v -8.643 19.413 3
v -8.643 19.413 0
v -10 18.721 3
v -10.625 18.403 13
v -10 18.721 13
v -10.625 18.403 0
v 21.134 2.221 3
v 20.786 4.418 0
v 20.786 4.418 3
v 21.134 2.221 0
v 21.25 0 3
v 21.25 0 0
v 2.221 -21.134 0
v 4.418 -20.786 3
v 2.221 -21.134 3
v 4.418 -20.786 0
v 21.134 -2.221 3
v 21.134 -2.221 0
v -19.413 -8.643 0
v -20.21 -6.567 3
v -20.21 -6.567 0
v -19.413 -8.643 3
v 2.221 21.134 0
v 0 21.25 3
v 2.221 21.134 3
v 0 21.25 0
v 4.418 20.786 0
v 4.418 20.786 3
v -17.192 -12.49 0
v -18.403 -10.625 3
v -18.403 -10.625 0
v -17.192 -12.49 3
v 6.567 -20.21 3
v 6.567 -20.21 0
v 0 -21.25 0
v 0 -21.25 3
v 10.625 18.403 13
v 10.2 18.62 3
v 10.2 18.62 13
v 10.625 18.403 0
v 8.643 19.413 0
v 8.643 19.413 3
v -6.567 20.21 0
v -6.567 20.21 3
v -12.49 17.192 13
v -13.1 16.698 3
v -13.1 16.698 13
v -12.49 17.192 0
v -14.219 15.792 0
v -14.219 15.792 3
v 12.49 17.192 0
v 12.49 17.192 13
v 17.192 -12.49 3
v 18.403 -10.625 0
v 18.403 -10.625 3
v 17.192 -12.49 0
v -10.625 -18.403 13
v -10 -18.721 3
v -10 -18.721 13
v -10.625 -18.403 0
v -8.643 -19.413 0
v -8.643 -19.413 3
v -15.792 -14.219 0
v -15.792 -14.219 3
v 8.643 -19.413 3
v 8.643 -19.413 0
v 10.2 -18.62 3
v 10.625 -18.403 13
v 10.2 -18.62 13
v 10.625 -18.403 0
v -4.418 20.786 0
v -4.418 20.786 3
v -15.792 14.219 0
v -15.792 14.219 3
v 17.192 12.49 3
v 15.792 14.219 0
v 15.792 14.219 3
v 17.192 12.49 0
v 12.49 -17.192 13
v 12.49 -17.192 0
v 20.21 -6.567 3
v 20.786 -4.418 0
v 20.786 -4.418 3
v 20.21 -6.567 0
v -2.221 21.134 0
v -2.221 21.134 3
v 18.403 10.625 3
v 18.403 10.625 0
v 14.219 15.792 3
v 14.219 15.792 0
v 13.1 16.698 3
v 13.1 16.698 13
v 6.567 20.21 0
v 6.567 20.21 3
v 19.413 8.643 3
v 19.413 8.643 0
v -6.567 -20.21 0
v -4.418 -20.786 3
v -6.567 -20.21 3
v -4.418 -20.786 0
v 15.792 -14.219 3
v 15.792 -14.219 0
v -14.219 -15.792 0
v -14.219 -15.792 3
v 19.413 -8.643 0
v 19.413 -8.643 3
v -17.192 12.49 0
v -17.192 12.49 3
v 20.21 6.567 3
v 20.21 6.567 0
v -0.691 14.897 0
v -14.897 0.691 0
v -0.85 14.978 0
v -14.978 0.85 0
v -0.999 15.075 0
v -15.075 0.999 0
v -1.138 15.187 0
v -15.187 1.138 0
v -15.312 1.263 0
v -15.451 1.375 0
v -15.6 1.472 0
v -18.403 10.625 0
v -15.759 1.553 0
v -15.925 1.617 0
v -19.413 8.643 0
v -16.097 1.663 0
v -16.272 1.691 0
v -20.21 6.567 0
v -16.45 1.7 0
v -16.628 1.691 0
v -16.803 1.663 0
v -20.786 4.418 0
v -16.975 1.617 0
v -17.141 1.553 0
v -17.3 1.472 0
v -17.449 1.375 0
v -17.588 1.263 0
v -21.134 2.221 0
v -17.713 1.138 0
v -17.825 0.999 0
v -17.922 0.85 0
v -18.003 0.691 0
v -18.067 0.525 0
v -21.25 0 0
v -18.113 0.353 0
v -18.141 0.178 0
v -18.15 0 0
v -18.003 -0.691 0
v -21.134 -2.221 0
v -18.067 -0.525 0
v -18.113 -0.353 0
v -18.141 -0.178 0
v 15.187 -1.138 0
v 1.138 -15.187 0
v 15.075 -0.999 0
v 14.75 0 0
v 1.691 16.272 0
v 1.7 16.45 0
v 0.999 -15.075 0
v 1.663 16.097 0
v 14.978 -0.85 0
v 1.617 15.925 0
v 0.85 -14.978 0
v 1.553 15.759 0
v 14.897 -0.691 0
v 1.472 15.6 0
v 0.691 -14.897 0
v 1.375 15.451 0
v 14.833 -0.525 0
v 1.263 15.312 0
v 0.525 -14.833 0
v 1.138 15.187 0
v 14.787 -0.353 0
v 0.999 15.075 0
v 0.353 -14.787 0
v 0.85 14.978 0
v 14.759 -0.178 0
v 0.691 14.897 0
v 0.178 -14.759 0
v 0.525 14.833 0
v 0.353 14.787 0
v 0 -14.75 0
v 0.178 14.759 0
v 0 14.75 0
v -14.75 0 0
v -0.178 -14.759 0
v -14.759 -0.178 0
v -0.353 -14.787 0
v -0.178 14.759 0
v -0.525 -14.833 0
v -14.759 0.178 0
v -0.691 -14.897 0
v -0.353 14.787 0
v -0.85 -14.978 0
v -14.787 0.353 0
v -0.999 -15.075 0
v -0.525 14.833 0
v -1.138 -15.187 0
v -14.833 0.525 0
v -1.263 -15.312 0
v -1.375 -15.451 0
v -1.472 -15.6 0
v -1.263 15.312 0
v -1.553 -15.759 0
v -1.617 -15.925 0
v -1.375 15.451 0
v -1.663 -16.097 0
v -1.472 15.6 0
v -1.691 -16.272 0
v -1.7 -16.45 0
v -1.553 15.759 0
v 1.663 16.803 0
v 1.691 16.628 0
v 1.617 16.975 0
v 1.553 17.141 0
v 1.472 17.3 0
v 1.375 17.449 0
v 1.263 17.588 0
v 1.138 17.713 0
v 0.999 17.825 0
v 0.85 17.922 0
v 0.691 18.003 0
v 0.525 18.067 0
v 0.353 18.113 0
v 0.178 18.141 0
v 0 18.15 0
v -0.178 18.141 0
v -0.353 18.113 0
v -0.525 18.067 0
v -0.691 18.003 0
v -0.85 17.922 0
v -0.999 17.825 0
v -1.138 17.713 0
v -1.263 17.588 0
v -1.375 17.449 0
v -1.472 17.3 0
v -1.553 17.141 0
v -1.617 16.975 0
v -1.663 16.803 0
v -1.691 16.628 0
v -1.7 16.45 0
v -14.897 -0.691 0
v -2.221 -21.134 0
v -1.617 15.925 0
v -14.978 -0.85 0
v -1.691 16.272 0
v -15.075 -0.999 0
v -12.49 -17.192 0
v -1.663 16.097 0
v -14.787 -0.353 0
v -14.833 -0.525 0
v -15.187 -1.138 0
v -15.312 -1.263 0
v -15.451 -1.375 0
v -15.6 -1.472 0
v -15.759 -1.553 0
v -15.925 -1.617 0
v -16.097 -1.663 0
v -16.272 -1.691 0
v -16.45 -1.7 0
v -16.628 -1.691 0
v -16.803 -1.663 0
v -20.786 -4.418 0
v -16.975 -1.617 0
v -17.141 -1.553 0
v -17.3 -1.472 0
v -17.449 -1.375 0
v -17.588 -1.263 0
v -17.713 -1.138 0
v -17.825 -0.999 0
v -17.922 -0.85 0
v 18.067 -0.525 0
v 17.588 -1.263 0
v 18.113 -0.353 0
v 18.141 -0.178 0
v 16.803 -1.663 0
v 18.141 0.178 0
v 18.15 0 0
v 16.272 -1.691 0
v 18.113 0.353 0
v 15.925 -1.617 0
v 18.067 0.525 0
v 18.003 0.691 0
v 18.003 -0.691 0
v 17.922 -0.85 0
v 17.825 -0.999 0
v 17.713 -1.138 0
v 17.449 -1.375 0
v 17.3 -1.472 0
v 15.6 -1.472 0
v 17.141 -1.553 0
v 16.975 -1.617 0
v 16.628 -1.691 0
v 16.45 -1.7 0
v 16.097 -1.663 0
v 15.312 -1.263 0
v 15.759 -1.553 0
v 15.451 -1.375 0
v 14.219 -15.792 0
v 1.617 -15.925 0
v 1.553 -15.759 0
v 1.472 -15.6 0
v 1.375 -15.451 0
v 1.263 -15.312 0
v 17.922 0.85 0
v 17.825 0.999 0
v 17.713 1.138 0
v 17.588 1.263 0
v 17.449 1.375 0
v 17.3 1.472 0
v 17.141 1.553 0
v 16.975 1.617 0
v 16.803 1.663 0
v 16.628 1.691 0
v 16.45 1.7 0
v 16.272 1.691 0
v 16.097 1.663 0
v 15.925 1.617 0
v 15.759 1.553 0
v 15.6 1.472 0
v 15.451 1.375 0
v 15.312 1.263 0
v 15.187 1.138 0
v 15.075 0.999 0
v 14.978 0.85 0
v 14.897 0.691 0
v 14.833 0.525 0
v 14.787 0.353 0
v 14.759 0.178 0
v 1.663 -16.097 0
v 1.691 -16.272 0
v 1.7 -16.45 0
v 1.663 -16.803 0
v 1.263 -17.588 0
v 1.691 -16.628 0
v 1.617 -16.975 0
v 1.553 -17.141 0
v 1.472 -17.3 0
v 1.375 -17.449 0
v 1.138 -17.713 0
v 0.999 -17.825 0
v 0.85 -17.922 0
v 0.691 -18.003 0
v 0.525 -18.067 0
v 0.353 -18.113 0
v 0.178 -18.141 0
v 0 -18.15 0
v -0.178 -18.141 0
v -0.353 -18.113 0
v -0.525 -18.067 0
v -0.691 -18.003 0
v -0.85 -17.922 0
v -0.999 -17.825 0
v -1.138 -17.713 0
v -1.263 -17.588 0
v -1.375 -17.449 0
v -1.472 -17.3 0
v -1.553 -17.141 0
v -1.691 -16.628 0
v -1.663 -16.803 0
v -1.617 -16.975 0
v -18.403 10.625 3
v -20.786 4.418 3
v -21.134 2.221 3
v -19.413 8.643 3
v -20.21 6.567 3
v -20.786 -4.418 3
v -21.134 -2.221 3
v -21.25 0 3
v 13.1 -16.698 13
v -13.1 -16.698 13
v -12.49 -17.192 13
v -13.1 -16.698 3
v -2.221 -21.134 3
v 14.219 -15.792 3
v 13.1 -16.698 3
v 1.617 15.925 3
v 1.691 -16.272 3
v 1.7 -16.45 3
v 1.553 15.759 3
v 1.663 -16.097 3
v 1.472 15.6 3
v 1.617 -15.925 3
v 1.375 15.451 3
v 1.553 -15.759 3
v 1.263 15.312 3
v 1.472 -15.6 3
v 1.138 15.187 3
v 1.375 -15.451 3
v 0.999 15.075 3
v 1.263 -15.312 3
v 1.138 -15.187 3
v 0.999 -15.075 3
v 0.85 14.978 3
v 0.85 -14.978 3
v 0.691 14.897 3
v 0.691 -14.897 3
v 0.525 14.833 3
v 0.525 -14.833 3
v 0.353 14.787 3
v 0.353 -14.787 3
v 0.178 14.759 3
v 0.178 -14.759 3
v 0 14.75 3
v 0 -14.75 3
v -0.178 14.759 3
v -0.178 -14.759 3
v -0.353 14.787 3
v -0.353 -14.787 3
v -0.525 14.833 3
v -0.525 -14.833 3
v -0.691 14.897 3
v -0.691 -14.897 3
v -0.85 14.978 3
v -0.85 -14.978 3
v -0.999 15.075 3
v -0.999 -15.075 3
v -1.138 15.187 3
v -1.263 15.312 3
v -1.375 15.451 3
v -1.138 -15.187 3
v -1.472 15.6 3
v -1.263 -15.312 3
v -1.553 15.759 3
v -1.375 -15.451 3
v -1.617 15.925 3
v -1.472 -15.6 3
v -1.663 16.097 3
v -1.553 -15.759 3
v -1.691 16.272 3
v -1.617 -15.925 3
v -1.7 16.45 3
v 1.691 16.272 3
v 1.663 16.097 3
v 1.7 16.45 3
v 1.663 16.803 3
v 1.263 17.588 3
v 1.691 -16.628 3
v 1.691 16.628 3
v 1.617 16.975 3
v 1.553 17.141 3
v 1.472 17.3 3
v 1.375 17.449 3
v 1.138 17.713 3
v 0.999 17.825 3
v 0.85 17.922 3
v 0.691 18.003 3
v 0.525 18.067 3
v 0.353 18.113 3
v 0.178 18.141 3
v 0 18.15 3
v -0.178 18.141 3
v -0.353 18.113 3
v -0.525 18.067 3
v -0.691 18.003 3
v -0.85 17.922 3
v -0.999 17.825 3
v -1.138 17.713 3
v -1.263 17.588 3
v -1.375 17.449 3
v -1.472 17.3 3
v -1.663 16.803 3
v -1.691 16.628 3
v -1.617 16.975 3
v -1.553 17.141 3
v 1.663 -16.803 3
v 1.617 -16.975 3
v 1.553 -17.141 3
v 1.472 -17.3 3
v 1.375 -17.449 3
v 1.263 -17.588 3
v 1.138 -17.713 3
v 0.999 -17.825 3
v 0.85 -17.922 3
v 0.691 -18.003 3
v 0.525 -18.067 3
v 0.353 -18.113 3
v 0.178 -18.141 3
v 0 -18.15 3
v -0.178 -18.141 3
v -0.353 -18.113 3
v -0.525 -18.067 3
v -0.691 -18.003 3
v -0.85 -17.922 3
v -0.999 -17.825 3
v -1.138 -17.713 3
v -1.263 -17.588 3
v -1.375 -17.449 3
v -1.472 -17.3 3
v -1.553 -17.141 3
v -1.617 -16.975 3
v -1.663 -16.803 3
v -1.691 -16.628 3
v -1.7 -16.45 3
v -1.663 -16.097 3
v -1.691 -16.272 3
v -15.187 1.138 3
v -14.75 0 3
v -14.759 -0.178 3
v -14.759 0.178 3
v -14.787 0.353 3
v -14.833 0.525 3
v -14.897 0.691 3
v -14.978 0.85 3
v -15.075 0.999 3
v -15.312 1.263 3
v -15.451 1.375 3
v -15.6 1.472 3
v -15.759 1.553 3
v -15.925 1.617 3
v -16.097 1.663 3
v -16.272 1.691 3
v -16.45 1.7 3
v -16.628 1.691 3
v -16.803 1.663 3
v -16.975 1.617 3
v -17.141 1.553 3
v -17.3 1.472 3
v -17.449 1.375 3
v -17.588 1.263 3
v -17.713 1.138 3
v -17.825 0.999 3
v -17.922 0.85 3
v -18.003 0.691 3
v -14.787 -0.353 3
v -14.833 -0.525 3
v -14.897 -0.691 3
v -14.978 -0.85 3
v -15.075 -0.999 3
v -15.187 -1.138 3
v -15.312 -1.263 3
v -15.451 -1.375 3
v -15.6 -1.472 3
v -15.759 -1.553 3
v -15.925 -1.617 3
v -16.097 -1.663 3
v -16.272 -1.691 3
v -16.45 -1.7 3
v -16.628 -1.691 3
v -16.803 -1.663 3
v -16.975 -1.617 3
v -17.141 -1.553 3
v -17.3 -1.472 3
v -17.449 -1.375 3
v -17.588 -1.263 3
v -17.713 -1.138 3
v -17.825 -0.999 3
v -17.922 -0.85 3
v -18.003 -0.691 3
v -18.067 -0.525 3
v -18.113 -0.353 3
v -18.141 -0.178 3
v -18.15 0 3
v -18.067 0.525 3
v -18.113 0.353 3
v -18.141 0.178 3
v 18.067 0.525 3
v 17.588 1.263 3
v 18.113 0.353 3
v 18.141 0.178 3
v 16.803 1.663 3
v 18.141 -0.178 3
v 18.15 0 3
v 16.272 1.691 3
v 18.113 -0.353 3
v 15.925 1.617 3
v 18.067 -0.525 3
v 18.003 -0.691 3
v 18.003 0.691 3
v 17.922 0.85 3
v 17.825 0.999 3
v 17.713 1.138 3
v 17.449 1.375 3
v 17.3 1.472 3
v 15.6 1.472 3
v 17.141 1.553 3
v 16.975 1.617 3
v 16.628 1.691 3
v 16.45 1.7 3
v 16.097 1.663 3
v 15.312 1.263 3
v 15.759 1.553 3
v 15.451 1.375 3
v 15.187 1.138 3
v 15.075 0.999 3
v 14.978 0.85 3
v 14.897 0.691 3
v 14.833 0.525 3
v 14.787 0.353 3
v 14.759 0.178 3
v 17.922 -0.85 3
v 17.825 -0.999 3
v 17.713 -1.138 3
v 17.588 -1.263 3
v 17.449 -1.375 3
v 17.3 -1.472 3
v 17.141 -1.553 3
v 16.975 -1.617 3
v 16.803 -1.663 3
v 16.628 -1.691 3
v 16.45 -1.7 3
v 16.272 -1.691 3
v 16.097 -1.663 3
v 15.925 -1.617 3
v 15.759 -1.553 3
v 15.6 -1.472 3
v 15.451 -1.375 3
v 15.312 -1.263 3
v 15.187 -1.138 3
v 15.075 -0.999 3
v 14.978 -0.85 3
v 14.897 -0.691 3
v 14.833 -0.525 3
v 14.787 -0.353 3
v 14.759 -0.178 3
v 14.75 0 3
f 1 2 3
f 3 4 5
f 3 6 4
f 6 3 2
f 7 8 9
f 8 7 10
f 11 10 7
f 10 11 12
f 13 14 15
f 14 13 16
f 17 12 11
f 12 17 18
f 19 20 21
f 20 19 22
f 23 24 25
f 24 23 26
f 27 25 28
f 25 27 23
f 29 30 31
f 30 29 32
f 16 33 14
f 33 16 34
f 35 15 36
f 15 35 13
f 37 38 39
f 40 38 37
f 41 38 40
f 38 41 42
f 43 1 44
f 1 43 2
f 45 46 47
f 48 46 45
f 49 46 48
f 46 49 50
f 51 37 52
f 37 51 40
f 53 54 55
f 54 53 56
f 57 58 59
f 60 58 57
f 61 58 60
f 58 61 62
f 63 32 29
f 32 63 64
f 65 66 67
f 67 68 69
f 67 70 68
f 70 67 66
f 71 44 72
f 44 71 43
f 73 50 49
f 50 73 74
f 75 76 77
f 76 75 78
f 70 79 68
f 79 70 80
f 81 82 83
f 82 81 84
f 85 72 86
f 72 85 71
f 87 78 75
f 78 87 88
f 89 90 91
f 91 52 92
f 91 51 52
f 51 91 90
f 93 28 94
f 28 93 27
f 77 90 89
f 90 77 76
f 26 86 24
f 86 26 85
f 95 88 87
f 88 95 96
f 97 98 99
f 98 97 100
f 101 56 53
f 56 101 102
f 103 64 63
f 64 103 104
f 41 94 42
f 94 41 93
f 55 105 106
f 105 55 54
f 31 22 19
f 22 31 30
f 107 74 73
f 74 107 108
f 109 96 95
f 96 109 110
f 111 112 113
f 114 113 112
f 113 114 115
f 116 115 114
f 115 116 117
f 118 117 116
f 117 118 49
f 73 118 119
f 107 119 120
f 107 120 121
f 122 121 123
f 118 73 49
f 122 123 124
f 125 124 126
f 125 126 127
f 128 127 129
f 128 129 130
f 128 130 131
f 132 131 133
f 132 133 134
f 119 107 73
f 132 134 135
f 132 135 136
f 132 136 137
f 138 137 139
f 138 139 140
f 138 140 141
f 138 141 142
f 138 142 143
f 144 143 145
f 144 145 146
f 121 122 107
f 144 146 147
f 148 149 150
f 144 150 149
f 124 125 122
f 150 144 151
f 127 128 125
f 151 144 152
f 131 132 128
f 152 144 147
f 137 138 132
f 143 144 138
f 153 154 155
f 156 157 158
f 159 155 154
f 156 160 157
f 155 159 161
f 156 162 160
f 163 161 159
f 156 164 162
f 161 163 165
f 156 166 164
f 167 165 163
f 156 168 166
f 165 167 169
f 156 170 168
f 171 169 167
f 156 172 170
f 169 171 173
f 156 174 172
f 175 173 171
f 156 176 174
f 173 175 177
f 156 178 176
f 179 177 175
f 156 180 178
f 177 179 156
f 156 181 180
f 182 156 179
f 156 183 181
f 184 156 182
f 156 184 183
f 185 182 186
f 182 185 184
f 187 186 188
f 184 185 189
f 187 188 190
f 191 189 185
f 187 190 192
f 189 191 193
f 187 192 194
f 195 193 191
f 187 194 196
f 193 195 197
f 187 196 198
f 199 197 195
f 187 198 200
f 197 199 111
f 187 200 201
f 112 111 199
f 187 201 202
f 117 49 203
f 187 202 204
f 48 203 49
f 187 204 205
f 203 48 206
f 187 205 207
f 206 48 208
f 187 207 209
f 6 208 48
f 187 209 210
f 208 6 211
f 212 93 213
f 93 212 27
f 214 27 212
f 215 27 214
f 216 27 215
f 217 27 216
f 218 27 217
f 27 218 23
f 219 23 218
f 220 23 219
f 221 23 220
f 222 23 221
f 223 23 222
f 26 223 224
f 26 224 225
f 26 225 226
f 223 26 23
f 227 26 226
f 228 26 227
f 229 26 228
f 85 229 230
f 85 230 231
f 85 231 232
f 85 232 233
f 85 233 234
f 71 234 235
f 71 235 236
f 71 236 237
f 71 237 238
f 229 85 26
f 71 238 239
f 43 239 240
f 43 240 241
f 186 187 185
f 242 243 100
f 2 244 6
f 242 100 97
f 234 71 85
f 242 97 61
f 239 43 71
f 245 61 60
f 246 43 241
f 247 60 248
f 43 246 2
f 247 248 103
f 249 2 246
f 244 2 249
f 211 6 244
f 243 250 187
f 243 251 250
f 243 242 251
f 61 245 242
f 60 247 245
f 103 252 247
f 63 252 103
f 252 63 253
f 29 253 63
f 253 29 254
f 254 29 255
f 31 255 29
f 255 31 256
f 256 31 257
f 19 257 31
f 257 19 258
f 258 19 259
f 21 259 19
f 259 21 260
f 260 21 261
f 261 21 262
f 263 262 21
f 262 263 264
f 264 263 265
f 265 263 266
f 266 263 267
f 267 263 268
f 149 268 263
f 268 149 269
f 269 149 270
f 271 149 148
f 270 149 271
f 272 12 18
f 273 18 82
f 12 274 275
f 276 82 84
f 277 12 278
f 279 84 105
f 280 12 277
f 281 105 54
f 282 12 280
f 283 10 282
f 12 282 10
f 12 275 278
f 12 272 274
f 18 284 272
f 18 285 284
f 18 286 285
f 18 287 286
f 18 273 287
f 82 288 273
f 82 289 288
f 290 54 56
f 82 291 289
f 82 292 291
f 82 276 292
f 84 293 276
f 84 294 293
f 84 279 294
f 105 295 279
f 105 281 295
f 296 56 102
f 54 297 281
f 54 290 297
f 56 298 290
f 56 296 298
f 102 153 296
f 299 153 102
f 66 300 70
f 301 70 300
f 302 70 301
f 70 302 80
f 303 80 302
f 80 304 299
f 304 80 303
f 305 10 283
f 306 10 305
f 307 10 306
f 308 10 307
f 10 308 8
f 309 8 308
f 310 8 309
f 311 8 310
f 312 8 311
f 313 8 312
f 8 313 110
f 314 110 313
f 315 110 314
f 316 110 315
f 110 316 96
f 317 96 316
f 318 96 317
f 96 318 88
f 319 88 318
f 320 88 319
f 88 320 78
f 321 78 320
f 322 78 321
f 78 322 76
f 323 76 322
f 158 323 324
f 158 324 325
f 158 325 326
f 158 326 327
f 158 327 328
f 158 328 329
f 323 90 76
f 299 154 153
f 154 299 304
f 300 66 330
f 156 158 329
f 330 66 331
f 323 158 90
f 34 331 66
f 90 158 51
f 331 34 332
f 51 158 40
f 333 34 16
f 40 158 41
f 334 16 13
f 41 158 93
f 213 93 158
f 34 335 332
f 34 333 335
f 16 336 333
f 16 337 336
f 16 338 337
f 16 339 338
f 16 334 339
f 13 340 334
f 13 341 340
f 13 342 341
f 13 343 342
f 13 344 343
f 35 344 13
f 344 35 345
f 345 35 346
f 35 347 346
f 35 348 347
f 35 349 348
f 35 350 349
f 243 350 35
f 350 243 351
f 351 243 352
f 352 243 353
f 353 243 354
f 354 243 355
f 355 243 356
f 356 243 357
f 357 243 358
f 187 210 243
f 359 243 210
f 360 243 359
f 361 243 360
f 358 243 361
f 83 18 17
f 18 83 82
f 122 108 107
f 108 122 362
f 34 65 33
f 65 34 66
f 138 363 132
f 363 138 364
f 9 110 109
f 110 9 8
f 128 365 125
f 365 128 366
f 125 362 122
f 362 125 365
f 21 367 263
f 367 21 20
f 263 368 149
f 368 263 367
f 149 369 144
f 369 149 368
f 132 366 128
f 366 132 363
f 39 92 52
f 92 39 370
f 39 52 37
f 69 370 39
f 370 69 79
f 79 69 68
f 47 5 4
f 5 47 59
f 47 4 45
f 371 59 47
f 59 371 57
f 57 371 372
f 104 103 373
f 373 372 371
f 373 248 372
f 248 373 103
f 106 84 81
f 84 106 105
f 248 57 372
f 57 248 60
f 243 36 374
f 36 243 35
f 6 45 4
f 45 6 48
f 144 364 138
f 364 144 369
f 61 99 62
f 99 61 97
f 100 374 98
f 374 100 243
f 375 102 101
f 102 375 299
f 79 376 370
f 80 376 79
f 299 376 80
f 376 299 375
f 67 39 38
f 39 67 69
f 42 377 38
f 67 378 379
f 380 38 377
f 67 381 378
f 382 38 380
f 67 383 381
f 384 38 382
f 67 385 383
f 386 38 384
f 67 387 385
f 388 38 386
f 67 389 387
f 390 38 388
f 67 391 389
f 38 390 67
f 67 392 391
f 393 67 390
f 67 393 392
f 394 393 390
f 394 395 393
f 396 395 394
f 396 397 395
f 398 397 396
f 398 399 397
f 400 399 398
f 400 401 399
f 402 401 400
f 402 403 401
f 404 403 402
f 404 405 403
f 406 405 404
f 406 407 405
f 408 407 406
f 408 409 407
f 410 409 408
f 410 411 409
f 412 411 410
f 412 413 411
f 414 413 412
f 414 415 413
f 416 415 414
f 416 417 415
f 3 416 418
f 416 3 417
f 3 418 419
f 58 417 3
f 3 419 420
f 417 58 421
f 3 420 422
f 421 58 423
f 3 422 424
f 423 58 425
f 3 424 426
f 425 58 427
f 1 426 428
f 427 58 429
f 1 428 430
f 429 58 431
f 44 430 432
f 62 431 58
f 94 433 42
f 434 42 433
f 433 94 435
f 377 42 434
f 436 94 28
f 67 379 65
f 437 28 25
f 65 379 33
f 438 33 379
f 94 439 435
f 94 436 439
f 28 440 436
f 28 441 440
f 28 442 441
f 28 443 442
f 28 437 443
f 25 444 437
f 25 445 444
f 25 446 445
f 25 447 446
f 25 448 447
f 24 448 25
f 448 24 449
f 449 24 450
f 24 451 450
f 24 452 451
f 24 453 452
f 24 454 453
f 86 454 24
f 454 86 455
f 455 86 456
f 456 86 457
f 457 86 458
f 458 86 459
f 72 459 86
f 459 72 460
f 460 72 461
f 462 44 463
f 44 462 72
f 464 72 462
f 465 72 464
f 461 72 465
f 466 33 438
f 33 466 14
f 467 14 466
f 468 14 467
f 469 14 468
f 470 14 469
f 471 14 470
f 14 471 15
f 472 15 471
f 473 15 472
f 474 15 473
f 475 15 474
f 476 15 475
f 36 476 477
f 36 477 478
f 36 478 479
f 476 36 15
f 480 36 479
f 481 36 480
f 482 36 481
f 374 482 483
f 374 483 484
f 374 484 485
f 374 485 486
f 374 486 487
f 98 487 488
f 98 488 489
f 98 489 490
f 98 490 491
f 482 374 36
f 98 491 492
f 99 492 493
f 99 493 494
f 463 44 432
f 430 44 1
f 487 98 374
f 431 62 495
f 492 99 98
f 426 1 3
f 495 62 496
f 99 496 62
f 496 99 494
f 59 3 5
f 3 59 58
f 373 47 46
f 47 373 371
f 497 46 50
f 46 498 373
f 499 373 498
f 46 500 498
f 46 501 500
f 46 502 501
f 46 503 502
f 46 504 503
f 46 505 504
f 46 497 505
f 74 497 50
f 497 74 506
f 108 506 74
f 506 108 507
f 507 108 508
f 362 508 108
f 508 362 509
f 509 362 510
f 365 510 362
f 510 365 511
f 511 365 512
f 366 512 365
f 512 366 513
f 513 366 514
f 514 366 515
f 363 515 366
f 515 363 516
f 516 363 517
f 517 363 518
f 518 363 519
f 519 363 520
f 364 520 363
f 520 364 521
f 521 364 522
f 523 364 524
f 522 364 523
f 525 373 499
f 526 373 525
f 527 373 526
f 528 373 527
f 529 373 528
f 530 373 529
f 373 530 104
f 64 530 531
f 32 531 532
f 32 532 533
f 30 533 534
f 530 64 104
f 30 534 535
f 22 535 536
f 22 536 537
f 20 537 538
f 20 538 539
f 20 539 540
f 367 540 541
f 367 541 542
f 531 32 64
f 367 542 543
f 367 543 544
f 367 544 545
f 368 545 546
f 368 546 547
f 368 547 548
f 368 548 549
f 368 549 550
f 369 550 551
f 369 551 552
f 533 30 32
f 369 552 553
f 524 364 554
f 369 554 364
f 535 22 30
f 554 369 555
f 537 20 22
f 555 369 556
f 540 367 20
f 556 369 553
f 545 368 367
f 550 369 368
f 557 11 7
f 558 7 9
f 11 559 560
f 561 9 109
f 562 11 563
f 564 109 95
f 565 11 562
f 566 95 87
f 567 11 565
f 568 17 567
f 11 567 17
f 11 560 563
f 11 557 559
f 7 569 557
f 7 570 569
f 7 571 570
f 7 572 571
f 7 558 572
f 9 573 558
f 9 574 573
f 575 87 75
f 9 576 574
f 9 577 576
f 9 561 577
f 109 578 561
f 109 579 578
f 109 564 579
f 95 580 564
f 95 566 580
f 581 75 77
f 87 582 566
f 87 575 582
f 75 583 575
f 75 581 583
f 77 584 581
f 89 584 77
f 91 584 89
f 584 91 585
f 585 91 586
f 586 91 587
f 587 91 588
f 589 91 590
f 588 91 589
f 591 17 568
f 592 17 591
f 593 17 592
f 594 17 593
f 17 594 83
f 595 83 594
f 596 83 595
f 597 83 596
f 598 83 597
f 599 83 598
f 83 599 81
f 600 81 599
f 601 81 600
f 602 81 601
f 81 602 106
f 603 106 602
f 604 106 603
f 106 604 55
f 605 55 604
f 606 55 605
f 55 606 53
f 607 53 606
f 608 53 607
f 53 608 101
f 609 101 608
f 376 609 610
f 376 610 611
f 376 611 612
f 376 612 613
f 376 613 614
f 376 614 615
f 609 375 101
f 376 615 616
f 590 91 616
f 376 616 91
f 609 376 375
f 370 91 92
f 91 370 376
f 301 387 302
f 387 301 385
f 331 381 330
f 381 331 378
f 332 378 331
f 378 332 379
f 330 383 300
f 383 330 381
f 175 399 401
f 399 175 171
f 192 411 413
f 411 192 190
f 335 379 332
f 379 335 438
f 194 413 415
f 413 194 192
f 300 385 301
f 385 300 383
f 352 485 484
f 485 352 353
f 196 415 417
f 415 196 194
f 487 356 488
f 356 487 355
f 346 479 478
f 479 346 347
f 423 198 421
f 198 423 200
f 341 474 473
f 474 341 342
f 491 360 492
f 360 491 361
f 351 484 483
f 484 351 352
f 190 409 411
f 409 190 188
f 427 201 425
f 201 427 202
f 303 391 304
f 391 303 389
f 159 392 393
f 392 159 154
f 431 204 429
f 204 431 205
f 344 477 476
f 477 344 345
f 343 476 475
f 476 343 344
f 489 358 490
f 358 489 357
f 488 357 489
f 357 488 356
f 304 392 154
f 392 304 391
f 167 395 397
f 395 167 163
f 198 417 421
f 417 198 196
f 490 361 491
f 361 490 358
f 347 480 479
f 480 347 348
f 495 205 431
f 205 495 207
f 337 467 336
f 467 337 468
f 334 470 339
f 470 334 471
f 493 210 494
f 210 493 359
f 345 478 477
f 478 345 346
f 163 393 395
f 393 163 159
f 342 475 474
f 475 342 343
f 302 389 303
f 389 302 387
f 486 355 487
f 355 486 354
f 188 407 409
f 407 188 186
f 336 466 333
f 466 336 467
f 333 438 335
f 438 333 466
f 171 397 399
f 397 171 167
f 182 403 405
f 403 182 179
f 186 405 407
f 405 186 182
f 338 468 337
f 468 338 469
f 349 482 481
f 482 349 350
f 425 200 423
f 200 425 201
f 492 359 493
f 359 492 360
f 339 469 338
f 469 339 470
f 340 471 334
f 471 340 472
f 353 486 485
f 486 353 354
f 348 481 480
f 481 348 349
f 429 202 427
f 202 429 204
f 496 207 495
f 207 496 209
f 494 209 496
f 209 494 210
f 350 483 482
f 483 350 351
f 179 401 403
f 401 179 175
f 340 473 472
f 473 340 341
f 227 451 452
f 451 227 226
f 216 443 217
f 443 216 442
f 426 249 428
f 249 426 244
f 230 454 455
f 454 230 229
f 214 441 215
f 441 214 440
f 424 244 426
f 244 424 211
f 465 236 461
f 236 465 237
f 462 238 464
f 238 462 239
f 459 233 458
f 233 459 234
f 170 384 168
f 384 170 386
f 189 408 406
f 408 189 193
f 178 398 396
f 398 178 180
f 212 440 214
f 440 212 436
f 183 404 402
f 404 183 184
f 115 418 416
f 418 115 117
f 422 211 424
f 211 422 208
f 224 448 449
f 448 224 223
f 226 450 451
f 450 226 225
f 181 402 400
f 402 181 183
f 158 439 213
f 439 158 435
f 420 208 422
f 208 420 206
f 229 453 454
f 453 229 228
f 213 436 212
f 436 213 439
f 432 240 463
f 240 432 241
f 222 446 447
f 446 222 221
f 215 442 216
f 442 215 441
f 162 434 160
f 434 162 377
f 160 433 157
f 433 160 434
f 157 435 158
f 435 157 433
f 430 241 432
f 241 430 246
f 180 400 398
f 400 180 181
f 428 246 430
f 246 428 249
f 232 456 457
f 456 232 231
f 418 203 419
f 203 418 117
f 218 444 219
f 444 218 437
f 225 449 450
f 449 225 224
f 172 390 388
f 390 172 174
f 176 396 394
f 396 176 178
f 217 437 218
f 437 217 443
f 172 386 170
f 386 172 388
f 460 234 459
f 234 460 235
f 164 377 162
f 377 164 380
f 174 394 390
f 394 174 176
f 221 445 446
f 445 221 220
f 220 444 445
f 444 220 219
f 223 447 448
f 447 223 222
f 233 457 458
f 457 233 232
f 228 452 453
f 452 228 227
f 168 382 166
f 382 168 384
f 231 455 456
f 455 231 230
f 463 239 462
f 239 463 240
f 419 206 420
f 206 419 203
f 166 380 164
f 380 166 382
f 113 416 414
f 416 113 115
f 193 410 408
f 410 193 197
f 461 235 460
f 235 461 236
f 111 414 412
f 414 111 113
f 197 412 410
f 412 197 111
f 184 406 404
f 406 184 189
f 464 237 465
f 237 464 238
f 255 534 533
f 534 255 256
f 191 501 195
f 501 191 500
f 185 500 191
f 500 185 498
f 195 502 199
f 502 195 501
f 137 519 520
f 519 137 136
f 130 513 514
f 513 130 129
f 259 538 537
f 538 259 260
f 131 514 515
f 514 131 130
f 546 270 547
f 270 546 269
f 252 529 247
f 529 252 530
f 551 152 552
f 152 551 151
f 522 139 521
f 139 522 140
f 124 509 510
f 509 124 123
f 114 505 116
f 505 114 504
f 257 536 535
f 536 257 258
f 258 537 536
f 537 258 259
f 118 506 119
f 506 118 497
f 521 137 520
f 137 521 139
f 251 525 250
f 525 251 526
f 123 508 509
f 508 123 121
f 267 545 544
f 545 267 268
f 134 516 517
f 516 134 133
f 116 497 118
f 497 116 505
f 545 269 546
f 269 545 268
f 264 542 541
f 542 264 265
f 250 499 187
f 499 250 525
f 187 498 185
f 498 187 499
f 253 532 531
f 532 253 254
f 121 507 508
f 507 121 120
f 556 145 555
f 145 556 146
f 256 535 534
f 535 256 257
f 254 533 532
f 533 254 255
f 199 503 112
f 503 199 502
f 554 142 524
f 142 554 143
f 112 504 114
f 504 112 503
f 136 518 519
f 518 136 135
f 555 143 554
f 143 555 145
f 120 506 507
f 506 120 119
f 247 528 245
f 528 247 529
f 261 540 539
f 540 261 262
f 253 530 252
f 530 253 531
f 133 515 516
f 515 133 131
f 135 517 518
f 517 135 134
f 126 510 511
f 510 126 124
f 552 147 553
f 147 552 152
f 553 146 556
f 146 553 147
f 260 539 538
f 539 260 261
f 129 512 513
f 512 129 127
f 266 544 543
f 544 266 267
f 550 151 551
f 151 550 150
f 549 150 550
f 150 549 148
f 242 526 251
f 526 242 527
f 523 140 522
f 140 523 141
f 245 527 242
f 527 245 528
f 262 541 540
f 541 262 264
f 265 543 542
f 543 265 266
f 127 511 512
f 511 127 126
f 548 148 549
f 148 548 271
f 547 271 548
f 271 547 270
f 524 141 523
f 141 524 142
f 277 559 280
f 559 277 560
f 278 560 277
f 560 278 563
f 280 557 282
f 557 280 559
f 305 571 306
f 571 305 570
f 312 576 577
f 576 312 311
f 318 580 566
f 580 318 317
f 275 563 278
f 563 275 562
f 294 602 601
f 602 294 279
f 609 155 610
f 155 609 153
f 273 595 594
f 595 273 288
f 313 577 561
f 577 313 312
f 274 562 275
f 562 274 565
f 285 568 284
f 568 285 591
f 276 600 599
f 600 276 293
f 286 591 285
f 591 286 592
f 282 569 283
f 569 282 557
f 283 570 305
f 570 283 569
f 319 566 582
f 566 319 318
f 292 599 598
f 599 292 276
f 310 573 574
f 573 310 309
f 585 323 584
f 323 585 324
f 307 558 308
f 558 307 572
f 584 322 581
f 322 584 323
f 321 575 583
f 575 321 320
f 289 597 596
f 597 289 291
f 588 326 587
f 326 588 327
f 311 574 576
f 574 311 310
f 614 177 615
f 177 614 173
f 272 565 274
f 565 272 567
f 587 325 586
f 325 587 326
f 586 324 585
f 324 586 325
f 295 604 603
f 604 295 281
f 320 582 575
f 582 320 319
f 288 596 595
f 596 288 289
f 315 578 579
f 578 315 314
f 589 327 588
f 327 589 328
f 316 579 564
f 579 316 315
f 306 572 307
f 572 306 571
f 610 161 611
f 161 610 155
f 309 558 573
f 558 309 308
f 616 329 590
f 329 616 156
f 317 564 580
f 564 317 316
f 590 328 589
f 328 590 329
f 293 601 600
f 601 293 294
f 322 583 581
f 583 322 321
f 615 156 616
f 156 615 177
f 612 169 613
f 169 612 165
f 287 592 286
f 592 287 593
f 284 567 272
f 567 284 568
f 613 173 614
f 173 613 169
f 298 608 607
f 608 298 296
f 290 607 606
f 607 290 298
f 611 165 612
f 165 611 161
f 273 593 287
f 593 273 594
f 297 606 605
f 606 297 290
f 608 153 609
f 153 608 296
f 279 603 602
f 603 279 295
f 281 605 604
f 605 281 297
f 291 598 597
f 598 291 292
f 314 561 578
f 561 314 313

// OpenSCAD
// [FL_INDEX: keywords="openscad, 3d_parametric, Aluminium_Bar_Quad_Motor_Mount, csg_solid" | COT="Parametric OpenSCAD design from 3DCodeverse"]
// Title: Aluminium Bar Quad Motor Mount

tube_thickness=20.2;
support_wall_thickness=3;
plate_diameter=42.5;
difference(){
cylinder(r=(plate_diameter/2),h=13,$fn=60);
translate([-10,-plate_diameter/2,3]) cube([tube_thickness,plate_diameter,20],centre=true);
translate([-(plate_diameter/2),-plate_diameter/2,3]) cube([((plate_diameter/2)-(tube_thickness/2+support_wall_thickness)),plate_diameter,20]);
translate([((plate_diameter/2)-((plate_diameter/2)-(tube_thickness/2+support_wall_thickness))),-plate_diameter/2,3]) cube([((plate_diameter/2)-(tube_thickness/2+support_wall_thickness)),plate_diameter,20]);
//mounting holes //
translate([0,-(42.5/2)+4.8,0]) cylinder(r=1.7,h=3,$fn=60);
translate([0,(42.5/2)-4.8,0]) cylinder(r=1.7,h=3,$fn=60);
translate([-(42.5/2)+4.8,0,0]) cylinder(r=1.7,h=3,$fn=60);
translate([(42.5/2)-4.8,0,0]) cylinder(r=1.7,h=3,$fn=60);
}
